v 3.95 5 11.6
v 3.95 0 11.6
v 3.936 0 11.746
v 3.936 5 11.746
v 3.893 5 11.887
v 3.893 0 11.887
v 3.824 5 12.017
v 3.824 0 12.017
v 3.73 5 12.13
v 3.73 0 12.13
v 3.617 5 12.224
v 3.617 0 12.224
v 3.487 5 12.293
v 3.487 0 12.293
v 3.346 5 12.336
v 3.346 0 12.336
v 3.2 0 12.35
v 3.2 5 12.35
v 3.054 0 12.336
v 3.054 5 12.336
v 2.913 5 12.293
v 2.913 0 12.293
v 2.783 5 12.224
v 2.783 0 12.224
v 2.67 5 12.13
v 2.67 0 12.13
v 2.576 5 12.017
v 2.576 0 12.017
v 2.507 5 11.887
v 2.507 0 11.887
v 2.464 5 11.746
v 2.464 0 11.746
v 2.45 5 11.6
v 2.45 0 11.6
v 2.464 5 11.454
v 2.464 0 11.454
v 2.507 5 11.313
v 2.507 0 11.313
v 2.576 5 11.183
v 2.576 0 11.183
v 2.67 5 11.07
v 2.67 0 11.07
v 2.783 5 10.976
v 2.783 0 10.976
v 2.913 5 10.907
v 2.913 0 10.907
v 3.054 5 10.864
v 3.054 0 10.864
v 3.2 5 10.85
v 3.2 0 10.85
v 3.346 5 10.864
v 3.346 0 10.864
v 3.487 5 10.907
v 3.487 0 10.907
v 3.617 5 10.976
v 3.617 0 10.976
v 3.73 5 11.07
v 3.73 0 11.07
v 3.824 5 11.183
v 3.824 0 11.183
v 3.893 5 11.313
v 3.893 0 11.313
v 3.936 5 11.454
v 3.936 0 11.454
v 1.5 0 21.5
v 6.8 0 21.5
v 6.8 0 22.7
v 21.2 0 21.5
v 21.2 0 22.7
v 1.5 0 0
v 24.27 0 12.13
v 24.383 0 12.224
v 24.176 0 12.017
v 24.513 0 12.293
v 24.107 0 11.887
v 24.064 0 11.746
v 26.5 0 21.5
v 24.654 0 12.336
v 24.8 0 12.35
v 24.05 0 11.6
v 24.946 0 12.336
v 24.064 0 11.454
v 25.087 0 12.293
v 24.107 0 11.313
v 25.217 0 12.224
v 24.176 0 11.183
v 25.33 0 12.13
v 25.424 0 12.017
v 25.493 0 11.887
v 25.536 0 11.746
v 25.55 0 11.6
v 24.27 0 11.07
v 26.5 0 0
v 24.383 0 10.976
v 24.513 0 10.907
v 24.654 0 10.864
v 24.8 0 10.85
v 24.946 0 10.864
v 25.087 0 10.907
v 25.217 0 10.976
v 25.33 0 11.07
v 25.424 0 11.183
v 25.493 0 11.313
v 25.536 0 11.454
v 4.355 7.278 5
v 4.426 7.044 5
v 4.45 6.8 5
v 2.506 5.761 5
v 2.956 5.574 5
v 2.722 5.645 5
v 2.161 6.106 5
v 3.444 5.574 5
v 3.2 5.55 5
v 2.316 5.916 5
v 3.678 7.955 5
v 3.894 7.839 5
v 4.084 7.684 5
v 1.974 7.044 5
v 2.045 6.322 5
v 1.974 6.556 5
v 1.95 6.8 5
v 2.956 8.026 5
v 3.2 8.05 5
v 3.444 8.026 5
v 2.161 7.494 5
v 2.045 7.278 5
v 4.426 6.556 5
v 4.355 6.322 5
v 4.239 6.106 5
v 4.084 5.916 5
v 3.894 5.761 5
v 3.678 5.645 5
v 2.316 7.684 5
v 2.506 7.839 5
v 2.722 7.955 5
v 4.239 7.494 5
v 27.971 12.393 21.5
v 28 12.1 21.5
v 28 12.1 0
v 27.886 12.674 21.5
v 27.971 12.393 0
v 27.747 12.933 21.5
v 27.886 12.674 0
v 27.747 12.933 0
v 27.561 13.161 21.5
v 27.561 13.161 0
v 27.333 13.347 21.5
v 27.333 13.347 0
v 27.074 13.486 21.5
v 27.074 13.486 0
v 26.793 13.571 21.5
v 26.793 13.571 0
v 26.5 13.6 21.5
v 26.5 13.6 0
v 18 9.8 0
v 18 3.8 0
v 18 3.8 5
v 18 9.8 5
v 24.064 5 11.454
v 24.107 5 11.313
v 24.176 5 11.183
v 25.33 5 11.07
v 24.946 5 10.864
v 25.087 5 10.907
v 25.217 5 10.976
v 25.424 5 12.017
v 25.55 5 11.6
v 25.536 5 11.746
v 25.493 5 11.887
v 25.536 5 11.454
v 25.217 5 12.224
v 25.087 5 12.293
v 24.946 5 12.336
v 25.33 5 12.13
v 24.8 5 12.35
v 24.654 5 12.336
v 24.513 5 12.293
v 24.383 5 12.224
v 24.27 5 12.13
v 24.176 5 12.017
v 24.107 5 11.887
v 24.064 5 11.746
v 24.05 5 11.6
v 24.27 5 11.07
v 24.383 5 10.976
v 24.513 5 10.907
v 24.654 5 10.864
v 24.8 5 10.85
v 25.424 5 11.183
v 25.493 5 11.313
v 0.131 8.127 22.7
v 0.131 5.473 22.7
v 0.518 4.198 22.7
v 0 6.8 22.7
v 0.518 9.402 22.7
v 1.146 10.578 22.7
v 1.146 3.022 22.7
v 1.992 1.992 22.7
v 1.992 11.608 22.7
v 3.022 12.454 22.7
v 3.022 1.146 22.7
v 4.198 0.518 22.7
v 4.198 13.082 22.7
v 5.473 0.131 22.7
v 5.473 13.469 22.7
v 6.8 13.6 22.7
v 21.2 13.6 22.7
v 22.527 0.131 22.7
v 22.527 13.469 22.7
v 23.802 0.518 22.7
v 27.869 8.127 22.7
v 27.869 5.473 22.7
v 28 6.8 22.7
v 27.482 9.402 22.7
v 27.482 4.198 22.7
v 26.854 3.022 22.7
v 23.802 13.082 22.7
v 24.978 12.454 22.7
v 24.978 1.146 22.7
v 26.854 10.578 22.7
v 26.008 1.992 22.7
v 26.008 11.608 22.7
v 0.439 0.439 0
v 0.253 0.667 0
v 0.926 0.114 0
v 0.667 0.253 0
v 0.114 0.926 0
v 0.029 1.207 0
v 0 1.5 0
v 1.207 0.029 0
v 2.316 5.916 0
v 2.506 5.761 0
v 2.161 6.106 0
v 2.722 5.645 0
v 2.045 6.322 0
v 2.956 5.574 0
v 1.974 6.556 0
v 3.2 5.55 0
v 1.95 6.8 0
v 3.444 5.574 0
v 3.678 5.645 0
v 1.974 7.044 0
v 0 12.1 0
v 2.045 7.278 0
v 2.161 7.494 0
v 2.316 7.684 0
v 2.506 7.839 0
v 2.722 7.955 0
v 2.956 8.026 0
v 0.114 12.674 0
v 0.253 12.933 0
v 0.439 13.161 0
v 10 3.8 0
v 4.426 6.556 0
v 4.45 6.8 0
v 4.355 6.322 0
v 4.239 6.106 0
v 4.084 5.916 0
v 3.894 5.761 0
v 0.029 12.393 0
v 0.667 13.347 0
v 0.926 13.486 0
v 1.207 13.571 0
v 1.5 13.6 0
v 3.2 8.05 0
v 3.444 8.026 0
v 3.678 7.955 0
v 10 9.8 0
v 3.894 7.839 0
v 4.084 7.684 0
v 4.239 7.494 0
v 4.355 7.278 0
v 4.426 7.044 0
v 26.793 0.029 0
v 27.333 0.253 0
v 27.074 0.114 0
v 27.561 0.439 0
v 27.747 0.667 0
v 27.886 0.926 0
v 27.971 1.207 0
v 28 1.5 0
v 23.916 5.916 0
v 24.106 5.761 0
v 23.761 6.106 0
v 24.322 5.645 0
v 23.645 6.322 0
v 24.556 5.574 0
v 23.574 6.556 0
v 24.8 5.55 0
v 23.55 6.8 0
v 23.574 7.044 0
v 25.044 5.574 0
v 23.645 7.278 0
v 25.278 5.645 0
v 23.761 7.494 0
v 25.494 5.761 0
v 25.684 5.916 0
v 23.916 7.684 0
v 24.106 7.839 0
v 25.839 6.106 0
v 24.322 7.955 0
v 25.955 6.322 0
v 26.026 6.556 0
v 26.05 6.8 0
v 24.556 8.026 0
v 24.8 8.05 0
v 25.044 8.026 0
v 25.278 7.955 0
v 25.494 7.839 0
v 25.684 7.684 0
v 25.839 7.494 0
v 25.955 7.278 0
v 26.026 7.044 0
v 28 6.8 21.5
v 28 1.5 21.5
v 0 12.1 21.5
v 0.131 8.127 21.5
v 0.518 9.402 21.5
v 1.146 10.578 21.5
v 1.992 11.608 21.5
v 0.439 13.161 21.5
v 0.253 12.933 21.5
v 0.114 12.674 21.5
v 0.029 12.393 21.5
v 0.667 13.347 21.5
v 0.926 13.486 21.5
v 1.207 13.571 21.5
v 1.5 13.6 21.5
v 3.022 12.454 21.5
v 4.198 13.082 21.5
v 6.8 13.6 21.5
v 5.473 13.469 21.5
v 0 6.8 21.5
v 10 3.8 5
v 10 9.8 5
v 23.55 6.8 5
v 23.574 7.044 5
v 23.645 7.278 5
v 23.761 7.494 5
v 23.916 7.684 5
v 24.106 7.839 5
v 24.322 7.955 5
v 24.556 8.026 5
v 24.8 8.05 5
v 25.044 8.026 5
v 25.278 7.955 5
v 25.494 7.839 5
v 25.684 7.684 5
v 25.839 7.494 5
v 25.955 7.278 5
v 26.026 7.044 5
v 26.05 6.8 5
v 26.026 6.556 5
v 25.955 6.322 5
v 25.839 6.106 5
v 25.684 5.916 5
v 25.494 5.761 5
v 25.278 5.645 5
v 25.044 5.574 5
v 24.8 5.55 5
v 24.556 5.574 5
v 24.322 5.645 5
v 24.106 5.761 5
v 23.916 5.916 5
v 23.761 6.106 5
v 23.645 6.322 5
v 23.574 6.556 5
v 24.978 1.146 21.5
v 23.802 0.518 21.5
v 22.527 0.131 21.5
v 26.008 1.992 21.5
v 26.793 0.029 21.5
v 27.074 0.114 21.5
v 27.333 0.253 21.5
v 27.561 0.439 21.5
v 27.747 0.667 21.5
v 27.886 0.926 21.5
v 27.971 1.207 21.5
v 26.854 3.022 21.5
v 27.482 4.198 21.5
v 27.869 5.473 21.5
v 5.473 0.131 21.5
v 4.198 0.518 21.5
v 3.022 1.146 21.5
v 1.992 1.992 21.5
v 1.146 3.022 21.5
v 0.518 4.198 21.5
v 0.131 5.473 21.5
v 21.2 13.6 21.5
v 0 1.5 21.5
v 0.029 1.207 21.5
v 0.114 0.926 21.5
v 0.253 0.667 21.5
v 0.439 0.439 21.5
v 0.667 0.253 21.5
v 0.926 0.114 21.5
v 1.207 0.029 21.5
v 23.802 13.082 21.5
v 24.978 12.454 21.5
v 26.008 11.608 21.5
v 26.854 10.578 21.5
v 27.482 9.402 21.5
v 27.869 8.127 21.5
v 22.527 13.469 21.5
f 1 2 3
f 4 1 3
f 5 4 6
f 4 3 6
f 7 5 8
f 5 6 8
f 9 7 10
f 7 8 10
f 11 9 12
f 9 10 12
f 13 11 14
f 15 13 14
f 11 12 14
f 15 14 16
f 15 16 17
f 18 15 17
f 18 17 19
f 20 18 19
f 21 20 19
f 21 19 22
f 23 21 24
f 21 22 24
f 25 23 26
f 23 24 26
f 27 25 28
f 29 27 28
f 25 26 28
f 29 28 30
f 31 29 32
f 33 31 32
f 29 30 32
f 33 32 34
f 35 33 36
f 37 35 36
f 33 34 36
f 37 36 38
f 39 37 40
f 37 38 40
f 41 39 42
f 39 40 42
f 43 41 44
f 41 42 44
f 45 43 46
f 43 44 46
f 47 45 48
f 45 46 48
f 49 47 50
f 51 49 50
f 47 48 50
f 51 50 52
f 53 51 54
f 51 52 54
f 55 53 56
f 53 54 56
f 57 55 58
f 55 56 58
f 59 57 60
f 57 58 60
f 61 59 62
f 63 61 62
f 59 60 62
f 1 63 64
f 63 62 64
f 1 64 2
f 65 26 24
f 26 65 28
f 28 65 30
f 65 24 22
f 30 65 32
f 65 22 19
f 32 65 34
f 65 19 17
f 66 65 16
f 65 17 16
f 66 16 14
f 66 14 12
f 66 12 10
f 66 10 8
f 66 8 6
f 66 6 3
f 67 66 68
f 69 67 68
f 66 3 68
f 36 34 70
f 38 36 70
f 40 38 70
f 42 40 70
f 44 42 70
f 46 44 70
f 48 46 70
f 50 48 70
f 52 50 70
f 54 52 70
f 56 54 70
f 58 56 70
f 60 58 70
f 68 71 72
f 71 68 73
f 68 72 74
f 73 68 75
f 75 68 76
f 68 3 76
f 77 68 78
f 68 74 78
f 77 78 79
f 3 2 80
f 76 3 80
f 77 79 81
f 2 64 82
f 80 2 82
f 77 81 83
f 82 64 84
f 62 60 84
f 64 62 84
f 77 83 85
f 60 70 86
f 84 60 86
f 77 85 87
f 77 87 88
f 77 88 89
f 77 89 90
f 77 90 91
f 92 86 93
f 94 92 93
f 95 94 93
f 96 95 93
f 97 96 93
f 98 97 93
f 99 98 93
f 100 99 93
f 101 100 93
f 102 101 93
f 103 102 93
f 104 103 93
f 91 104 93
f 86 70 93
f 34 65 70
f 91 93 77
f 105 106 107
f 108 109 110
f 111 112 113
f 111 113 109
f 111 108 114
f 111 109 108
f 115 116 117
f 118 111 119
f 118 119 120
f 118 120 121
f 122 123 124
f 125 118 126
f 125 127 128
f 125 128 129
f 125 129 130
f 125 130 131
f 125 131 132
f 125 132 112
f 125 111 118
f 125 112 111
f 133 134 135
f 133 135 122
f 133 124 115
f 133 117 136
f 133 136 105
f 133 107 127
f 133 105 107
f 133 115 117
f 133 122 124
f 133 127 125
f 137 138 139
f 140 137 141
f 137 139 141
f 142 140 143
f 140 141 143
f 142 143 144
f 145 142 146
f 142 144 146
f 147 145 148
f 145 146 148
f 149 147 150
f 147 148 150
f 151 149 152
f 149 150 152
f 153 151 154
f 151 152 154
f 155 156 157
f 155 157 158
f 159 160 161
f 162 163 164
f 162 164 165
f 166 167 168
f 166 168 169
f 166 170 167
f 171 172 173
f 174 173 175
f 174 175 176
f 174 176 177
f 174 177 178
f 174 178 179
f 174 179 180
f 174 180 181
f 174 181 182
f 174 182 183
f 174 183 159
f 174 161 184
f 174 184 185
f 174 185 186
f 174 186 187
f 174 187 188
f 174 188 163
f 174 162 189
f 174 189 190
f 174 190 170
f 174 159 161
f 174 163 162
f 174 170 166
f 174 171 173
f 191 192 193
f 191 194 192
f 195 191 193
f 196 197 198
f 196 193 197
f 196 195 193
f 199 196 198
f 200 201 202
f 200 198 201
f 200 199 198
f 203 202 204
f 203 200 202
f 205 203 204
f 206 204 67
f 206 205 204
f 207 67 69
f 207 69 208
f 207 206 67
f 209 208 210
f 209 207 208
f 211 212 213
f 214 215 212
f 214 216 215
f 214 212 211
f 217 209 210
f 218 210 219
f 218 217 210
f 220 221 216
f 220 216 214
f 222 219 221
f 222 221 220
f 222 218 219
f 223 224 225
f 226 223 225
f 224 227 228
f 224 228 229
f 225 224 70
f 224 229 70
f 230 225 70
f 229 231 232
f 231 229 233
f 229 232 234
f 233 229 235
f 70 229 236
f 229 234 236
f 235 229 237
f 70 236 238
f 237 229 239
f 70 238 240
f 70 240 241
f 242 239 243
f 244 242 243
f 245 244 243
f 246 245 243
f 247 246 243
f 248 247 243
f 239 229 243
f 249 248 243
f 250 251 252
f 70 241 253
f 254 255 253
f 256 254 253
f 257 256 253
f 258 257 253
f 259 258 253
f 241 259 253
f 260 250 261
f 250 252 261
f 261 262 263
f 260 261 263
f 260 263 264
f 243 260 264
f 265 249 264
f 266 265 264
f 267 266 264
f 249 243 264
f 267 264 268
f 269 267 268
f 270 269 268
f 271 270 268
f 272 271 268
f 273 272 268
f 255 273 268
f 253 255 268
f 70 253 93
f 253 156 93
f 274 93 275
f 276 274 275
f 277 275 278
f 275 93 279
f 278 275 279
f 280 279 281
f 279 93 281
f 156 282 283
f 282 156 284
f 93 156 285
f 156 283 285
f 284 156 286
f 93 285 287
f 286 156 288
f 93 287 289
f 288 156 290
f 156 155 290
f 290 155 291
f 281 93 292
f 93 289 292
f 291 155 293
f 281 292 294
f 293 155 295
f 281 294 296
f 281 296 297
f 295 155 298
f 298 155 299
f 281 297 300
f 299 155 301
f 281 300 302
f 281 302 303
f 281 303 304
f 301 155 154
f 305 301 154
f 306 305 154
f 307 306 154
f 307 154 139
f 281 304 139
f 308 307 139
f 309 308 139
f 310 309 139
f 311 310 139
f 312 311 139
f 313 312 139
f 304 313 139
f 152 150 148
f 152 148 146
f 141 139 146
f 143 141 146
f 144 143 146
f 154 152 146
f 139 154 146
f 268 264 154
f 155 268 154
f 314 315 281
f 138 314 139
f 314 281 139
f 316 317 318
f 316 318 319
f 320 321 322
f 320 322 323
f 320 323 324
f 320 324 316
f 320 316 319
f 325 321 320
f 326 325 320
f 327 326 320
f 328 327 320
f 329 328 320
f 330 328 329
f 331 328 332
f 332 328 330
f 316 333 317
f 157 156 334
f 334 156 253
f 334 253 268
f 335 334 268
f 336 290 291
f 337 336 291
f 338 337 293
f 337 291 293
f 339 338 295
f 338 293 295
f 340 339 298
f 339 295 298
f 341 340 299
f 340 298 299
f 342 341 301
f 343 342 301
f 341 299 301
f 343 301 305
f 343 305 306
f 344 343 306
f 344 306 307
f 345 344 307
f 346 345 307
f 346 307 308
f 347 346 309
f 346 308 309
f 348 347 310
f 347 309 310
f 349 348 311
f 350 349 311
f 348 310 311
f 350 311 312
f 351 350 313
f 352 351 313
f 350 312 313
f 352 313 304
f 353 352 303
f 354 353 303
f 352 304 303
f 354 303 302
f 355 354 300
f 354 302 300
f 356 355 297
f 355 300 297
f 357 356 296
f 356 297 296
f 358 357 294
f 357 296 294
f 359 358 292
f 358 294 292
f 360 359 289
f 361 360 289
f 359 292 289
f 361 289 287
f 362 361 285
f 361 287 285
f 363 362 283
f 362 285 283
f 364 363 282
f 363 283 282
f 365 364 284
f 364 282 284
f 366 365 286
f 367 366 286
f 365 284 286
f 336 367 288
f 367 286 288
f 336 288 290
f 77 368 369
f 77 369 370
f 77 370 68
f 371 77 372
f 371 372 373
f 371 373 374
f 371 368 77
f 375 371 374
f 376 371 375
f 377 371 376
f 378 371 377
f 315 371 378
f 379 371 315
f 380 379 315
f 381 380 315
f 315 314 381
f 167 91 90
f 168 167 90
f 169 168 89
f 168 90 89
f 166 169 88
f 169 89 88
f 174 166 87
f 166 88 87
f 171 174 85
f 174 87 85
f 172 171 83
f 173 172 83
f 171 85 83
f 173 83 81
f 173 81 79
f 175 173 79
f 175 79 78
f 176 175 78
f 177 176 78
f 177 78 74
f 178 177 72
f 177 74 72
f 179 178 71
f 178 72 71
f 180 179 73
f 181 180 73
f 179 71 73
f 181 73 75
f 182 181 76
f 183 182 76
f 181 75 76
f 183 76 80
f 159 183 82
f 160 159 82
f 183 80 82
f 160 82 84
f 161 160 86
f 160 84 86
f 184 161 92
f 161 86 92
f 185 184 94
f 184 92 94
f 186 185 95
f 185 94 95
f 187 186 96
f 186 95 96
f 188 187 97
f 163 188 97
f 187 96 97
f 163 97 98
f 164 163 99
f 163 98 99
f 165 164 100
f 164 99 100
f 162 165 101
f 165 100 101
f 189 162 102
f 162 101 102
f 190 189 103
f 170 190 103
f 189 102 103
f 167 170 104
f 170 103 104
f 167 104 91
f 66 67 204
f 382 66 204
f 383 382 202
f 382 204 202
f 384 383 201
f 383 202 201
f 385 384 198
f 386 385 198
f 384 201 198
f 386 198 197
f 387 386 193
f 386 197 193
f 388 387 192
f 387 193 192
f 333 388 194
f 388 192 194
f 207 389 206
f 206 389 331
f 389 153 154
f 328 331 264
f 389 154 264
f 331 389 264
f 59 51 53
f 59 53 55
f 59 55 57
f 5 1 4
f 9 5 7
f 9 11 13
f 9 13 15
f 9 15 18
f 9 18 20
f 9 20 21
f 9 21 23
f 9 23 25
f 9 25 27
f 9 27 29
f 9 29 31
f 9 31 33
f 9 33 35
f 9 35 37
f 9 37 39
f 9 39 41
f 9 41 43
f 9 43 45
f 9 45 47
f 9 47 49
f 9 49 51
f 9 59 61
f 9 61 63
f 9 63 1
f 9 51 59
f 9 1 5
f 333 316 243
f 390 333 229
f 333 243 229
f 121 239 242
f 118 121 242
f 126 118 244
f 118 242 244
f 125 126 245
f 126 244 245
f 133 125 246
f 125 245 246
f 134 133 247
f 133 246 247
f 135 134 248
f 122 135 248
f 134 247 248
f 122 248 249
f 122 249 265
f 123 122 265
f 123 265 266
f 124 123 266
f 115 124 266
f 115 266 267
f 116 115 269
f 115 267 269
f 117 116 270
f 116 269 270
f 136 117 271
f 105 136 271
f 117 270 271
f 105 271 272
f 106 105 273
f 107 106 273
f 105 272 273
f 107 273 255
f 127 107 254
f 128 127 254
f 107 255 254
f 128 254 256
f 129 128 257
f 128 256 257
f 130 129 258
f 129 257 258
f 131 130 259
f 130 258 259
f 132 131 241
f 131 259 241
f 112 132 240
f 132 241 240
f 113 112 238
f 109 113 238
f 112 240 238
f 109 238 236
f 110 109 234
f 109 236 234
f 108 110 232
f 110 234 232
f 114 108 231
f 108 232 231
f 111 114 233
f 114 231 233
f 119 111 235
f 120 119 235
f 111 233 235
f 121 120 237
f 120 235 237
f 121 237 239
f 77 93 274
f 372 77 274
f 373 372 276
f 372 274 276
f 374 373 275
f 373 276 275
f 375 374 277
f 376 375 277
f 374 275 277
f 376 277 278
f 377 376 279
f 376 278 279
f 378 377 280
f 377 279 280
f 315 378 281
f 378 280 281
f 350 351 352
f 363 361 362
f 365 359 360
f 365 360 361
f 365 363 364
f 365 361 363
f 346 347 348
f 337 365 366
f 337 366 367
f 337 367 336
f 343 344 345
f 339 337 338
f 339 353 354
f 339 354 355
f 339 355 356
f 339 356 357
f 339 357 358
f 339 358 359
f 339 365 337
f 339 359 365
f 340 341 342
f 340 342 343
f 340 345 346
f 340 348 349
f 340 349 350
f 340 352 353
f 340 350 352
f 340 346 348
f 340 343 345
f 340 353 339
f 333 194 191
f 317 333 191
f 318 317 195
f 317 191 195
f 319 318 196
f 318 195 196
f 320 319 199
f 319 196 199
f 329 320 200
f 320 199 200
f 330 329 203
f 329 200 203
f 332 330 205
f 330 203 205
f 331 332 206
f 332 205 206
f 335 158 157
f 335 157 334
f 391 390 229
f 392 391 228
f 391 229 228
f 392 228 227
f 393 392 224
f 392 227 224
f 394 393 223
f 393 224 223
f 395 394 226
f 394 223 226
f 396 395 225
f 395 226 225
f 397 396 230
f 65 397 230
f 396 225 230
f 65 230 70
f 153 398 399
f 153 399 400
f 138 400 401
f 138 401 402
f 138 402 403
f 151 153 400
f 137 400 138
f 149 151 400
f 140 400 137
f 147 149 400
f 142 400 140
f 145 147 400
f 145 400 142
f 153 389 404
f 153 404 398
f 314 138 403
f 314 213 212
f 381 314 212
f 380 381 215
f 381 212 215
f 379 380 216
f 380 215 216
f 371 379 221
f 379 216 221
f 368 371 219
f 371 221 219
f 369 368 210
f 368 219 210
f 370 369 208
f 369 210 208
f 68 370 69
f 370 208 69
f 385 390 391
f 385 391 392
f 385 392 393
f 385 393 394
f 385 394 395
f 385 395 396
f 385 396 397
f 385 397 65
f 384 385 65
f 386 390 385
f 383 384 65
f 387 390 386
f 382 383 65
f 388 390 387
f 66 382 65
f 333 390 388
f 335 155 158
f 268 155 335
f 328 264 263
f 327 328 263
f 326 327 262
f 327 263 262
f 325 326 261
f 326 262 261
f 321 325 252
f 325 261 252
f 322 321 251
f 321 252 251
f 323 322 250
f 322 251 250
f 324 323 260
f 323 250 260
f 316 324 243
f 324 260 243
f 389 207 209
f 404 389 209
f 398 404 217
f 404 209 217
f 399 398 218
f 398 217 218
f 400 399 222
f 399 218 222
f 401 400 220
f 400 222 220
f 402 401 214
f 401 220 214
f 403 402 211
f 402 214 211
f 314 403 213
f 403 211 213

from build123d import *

# Parameters (mm, degrees)
EXTRUDE_1_DEPTH     = 22.7
CUT_EXTRUDE_1_DEPTH = 1.2
SKETCH_3_R          = 1.25
SKETCH_3_W          = 8
SKETCH_3_H          = 6
CUT_EXTRUDE_2_DEPTH = 5
SKETCH_4_R          = 0.75
CUT_EXTRUDE_3_DEPTH = 5


with BuildPart() as part:
    # 草图1 → 凸台-拉伸1 (new body)
    with BuildSketch(Plane.XY):
        with BuildLine():
            Line((1.5, 0), (26.5, 0))
            ThreePointArc((26.5, 0), (27.560660172, 0.439339828), (28, 1.5))
            Line((28, 1.5), (28, 12.1))
            ThreePointArc((28, 12.1), (27.560660172, 13.160660172), (26.5, 13.6))
            Line((26.5, 13.6), (1.5, 13.6))
            ThreePointArc((1.5, 13.6), (0.439339828, 13.160660172), (0, 12.1))
            Line((0, 12.1), (0, 1.5))
            ThreePointArc((0, 1.5), (0.439339828, 0.439339828), (1.5, 0))
        make_face()
    extrude(amount=EXTRUDE_1_DEPTH)

    # 草图2 → 切除-拉伸1 (cut)
    with BuildSketch(Plane.XY.offset(22.7)):
        with BuildLine():
            ThreePointArc((0, 6.800000018), (1.991673894, 11.608326118), (6.8, 13.6))
            Line((6.8, 13.6), (1.5, 13.6))
            ThreePointArc((1.5, 13.6), (0.439339828, 13.160660172), (0, 12.1))
            Line((0, 12.1), (0, 6.800000018))
        make_face()
        with BuildLine():
            ThreePointArc((6.8, 0), (1.991673882, 1.991673894), (0, 6.800000018))
            Line((0, 6.800000018), (0, 1.5))
            ThreePointArc((0, 1.5), (0.439339828, 0.439339828), (1.5, 0))
            Line((1.5, 0), (6.8, 0))
        make_face()
        with BuildLine():
            Line((28, 1.5), (28, 6.8))
            ThreePointArc((28, 6.8), (26.008326112, 1.991673888), (21.2, 0))
            Line((21.2, 0), (26.5, 0))
            ThreePointArc((26.5, 0), (27.560660172, 0.439339828), (28, 1.5))
        make_face()
        with BuildLine():
            Line((26.5, 13.6), (21.2, 13.6))
            ThreePointArc((21.2, 13.6), (26.008326112, 11.608326112), (28, 6.8))
            Line((28, 6.8), (28, 12.1))
            ThreePointArc((28, 12.1), (27.560660172, 13.160660172), (26.5, 13.6))
        make_face()
    extrude(amount=-CUT_EXTRUDE_1_DEPTH, mode=Mode.SUBTRACT)

    # 草图3 → 切除-拉伸2 (cut)
    with BuildSketch(Plane(origin=(0, 0, 0), x_dir=(-1, 0, 0), z_dir=(0, 0, -1))):
        with Locations((-24.8, 6.8)):
            Circle(SKETCH_3_R)
        with Locations((-3.2, 6.8)):
            Circle(SKETCH_3_R)
        with Locations((-14, 6.8)):
            Rectangle(SKETCH_3_W, SKETCH_3_H)
    extrude(amount=-CUT_EXTRUDE_2_DEPTH, mode=Mode.SUBTRACT)

    # 草图4 → 切除-拉伸3 (cut)
    with BuildSketch(Plane.XZ):
        with Locations((24.8, 11.6)):
            Circle(SKETCH_4_R)
        with Locations((3.2, 11.6)):
            Circle(SKETCH_4_R)
    extrude(amount=-CUT_EXTRUDE_3_DEPTH, mode=Mode.SUBTRACT)


solid = part.part
